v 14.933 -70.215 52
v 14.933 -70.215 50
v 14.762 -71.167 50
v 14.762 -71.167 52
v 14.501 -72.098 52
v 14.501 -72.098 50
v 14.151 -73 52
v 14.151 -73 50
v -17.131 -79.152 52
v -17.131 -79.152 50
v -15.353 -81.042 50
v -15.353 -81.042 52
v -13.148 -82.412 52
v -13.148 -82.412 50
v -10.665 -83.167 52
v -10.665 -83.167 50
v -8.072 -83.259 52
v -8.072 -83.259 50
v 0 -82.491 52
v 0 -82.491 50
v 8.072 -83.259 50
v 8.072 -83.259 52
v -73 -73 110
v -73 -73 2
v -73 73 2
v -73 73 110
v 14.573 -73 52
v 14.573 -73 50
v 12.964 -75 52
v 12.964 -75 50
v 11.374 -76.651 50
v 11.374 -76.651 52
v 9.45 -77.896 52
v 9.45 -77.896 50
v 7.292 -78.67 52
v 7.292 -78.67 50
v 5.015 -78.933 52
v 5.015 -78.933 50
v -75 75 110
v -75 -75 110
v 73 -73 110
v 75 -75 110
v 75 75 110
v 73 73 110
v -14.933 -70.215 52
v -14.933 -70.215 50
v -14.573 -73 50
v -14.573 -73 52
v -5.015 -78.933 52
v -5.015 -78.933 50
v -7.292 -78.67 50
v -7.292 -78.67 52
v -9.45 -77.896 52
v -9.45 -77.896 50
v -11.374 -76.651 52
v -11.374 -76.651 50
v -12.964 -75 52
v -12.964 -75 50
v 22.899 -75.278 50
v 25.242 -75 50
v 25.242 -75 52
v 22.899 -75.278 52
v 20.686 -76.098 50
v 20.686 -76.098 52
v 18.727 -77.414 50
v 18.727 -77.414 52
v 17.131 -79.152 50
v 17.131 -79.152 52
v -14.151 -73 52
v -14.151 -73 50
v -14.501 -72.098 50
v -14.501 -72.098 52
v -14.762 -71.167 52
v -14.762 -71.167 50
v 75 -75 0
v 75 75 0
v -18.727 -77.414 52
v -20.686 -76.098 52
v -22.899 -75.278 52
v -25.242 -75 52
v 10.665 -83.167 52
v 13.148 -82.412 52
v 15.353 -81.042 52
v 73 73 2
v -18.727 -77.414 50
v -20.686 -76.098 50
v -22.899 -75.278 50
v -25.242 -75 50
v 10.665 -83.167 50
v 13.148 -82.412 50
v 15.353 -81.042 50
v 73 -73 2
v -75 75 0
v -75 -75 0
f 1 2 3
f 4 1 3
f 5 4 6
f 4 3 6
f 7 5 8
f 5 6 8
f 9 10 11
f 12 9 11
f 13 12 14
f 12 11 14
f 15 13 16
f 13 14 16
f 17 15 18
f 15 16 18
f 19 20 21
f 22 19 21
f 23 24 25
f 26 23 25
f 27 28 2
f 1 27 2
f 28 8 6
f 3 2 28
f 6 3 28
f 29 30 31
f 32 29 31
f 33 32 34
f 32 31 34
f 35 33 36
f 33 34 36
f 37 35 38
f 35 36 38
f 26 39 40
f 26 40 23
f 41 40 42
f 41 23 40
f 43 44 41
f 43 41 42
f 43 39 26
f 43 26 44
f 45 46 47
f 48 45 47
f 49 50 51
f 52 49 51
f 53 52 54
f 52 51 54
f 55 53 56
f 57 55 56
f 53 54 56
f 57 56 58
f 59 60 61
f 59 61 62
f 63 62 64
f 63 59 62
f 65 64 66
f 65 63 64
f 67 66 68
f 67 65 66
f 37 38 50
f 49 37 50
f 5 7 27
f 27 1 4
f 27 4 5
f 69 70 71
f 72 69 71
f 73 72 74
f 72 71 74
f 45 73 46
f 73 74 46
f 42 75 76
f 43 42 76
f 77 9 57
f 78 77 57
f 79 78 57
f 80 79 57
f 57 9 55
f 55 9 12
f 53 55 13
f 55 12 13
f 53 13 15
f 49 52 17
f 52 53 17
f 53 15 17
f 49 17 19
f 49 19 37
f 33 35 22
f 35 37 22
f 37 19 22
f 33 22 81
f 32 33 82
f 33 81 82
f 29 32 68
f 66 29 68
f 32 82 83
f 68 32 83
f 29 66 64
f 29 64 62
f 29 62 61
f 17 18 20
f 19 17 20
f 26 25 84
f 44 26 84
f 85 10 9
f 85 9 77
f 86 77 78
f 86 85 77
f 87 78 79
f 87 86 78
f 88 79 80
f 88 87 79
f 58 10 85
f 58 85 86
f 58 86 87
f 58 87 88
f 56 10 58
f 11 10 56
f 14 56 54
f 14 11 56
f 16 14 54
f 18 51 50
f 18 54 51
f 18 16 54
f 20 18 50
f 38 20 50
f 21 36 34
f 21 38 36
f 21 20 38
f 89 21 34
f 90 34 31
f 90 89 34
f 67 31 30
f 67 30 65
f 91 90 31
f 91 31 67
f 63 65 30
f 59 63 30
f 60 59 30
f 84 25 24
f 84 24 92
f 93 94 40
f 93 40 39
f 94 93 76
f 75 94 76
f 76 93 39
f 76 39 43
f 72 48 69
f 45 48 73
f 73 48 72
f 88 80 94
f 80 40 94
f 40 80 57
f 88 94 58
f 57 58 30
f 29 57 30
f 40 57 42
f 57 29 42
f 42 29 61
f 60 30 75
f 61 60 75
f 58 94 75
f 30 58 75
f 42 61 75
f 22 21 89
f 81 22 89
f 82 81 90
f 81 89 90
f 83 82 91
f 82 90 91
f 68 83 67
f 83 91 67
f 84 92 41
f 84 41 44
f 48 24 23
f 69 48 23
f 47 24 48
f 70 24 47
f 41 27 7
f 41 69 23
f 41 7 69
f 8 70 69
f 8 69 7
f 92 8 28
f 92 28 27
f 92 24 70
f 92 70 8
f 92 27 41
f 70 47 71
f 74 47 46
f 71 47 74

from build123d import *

# Parameters (mm, degrees)
SKETCH_1_W      = 150
SKETCH_1_H      = 150
EXTRUDE_1_DEPTH = 110
SHELL_1_T       = -2
EXTRUDE_START   = -60
EXTRUDE_2_DEPTH = 2
FILLET_1_R      = 10


with BuildPart() as part:
    # 草图1 → 凸台-拉伸1 (new body)
    with BuildSketch(Plane.XY):
        Rectangle(SKETCH_1_W, SKETCH_1_H)
    extrude(amount=EXTRUDE_1_DEPTH)

    # 抽壳1
    shell_1_openings = [part.faces().sort_by_distance(p)[0] for p in [
        (0, 0, 110),
    ]]
    offset(amount=SHELL_1_T, openings=shell_1_openings, kind=Kind.INTERSECTION)

    # 草图2 → 凸台-拉伸2 (add)
    with BuildSketch(Plane.XY.offset(110).offset(EXTRUDE_START)):
        with BuildLine():
            Line((-19.944653056, -75), (-17.301604129, -78.907070498))
            ThreePointArc((-17.301604129, -78.907070498), (-13.28346315, -82.348966768), (-8.071553148, -83.258967309))
            Line((-8.071553148, -83.258967309), (0, -82.490938419))
            Line((0, -82.490938419), (8.071553148, -83.258967309))
            ThreePointArc((8.071553148, -83.258967309), (13.28346315, -82.348966768), (17.301604129, -78.907070498))
            Line((17.301604129, -78.907070498), (19.944653056, -75))
            Line((19.944653056, -75), (14.314326214, -75))
            Line((14.314326214, -75), (14.932632038, -70.214502915))
            ThreePointArc((14.932632038, -70.214502915), (11.617573252, -76.443569186), (5.01506981, -78.933113254))
            Line((5.01506981, -78.933113254), (-5.01506981, -78.933113254))
            ThreePointArc((-5.01506981, -78.933113254), (-11.617573252, -76.443569186), (-14.932632038, -70.214502915))
            Line((-14.932632038, -70.214502915), (-14.314326214, -75))
            Line((-14.314326214, -75), (-19.944653056, -75))
        make_face()
    extrude(amount=EXTRUDE_2_DEPTH)

    # 圆角1
    # the kernel refuses this fillet: 10 mm, written as the material it adds along each edge
    with BuildSketch(Plane(origin=(19.944653056, -75, 50), x_dir=(1, 0, 0), z_dir=(0, 0, 1))) as fillet_1_piece_1:
        with BuildLine():
            CenterArc((5.297648539, -10), FILLET_1_R, 90, 54.21089853)
            Line((-2.814102182, -4.151966123), (-3.625277254, -3.567162735))
            ThreePointArc((-3.625277254, -3.567162735), (-3.471329325, -3.346756673), (-0.828280398, 0.560313825))
            Line((-0.828280398, 0.560313825), (0, 1))
            Line((0, 1), (5.297648539, 1))
            Line((5.297648539, 1), (5.297648539, 0))
        make_face()
    extrude(amount=2)
    with BuildSketch(Plane(origin=(-19.944653056, -75, 50), x_dir=(-1, 0, 0), z_dir=(0, 0, 1))) as fillet_1_piece_2:
        with BuildLine():
            CenterArc((5.297648539, 10), FILLET_1_R, 215.78910147, 54.21089853)
            Line((-2.814102182, 4.151966123), (-3.625277254, 3.567162735))
            ThreePointArc((-3.625277254, 3.567162735), (-3.471329325, 3.346756673), (-0.828280398, -0.560313825))
            Line((-0.828280398, -0.560313825), (0, -1))
            Line((0, -1), (5.297648539, -1))
            Line((5.297648539, -1), (5.297648539, 0))
        make_face()
    extrude(amount=2)


solid = part.part
